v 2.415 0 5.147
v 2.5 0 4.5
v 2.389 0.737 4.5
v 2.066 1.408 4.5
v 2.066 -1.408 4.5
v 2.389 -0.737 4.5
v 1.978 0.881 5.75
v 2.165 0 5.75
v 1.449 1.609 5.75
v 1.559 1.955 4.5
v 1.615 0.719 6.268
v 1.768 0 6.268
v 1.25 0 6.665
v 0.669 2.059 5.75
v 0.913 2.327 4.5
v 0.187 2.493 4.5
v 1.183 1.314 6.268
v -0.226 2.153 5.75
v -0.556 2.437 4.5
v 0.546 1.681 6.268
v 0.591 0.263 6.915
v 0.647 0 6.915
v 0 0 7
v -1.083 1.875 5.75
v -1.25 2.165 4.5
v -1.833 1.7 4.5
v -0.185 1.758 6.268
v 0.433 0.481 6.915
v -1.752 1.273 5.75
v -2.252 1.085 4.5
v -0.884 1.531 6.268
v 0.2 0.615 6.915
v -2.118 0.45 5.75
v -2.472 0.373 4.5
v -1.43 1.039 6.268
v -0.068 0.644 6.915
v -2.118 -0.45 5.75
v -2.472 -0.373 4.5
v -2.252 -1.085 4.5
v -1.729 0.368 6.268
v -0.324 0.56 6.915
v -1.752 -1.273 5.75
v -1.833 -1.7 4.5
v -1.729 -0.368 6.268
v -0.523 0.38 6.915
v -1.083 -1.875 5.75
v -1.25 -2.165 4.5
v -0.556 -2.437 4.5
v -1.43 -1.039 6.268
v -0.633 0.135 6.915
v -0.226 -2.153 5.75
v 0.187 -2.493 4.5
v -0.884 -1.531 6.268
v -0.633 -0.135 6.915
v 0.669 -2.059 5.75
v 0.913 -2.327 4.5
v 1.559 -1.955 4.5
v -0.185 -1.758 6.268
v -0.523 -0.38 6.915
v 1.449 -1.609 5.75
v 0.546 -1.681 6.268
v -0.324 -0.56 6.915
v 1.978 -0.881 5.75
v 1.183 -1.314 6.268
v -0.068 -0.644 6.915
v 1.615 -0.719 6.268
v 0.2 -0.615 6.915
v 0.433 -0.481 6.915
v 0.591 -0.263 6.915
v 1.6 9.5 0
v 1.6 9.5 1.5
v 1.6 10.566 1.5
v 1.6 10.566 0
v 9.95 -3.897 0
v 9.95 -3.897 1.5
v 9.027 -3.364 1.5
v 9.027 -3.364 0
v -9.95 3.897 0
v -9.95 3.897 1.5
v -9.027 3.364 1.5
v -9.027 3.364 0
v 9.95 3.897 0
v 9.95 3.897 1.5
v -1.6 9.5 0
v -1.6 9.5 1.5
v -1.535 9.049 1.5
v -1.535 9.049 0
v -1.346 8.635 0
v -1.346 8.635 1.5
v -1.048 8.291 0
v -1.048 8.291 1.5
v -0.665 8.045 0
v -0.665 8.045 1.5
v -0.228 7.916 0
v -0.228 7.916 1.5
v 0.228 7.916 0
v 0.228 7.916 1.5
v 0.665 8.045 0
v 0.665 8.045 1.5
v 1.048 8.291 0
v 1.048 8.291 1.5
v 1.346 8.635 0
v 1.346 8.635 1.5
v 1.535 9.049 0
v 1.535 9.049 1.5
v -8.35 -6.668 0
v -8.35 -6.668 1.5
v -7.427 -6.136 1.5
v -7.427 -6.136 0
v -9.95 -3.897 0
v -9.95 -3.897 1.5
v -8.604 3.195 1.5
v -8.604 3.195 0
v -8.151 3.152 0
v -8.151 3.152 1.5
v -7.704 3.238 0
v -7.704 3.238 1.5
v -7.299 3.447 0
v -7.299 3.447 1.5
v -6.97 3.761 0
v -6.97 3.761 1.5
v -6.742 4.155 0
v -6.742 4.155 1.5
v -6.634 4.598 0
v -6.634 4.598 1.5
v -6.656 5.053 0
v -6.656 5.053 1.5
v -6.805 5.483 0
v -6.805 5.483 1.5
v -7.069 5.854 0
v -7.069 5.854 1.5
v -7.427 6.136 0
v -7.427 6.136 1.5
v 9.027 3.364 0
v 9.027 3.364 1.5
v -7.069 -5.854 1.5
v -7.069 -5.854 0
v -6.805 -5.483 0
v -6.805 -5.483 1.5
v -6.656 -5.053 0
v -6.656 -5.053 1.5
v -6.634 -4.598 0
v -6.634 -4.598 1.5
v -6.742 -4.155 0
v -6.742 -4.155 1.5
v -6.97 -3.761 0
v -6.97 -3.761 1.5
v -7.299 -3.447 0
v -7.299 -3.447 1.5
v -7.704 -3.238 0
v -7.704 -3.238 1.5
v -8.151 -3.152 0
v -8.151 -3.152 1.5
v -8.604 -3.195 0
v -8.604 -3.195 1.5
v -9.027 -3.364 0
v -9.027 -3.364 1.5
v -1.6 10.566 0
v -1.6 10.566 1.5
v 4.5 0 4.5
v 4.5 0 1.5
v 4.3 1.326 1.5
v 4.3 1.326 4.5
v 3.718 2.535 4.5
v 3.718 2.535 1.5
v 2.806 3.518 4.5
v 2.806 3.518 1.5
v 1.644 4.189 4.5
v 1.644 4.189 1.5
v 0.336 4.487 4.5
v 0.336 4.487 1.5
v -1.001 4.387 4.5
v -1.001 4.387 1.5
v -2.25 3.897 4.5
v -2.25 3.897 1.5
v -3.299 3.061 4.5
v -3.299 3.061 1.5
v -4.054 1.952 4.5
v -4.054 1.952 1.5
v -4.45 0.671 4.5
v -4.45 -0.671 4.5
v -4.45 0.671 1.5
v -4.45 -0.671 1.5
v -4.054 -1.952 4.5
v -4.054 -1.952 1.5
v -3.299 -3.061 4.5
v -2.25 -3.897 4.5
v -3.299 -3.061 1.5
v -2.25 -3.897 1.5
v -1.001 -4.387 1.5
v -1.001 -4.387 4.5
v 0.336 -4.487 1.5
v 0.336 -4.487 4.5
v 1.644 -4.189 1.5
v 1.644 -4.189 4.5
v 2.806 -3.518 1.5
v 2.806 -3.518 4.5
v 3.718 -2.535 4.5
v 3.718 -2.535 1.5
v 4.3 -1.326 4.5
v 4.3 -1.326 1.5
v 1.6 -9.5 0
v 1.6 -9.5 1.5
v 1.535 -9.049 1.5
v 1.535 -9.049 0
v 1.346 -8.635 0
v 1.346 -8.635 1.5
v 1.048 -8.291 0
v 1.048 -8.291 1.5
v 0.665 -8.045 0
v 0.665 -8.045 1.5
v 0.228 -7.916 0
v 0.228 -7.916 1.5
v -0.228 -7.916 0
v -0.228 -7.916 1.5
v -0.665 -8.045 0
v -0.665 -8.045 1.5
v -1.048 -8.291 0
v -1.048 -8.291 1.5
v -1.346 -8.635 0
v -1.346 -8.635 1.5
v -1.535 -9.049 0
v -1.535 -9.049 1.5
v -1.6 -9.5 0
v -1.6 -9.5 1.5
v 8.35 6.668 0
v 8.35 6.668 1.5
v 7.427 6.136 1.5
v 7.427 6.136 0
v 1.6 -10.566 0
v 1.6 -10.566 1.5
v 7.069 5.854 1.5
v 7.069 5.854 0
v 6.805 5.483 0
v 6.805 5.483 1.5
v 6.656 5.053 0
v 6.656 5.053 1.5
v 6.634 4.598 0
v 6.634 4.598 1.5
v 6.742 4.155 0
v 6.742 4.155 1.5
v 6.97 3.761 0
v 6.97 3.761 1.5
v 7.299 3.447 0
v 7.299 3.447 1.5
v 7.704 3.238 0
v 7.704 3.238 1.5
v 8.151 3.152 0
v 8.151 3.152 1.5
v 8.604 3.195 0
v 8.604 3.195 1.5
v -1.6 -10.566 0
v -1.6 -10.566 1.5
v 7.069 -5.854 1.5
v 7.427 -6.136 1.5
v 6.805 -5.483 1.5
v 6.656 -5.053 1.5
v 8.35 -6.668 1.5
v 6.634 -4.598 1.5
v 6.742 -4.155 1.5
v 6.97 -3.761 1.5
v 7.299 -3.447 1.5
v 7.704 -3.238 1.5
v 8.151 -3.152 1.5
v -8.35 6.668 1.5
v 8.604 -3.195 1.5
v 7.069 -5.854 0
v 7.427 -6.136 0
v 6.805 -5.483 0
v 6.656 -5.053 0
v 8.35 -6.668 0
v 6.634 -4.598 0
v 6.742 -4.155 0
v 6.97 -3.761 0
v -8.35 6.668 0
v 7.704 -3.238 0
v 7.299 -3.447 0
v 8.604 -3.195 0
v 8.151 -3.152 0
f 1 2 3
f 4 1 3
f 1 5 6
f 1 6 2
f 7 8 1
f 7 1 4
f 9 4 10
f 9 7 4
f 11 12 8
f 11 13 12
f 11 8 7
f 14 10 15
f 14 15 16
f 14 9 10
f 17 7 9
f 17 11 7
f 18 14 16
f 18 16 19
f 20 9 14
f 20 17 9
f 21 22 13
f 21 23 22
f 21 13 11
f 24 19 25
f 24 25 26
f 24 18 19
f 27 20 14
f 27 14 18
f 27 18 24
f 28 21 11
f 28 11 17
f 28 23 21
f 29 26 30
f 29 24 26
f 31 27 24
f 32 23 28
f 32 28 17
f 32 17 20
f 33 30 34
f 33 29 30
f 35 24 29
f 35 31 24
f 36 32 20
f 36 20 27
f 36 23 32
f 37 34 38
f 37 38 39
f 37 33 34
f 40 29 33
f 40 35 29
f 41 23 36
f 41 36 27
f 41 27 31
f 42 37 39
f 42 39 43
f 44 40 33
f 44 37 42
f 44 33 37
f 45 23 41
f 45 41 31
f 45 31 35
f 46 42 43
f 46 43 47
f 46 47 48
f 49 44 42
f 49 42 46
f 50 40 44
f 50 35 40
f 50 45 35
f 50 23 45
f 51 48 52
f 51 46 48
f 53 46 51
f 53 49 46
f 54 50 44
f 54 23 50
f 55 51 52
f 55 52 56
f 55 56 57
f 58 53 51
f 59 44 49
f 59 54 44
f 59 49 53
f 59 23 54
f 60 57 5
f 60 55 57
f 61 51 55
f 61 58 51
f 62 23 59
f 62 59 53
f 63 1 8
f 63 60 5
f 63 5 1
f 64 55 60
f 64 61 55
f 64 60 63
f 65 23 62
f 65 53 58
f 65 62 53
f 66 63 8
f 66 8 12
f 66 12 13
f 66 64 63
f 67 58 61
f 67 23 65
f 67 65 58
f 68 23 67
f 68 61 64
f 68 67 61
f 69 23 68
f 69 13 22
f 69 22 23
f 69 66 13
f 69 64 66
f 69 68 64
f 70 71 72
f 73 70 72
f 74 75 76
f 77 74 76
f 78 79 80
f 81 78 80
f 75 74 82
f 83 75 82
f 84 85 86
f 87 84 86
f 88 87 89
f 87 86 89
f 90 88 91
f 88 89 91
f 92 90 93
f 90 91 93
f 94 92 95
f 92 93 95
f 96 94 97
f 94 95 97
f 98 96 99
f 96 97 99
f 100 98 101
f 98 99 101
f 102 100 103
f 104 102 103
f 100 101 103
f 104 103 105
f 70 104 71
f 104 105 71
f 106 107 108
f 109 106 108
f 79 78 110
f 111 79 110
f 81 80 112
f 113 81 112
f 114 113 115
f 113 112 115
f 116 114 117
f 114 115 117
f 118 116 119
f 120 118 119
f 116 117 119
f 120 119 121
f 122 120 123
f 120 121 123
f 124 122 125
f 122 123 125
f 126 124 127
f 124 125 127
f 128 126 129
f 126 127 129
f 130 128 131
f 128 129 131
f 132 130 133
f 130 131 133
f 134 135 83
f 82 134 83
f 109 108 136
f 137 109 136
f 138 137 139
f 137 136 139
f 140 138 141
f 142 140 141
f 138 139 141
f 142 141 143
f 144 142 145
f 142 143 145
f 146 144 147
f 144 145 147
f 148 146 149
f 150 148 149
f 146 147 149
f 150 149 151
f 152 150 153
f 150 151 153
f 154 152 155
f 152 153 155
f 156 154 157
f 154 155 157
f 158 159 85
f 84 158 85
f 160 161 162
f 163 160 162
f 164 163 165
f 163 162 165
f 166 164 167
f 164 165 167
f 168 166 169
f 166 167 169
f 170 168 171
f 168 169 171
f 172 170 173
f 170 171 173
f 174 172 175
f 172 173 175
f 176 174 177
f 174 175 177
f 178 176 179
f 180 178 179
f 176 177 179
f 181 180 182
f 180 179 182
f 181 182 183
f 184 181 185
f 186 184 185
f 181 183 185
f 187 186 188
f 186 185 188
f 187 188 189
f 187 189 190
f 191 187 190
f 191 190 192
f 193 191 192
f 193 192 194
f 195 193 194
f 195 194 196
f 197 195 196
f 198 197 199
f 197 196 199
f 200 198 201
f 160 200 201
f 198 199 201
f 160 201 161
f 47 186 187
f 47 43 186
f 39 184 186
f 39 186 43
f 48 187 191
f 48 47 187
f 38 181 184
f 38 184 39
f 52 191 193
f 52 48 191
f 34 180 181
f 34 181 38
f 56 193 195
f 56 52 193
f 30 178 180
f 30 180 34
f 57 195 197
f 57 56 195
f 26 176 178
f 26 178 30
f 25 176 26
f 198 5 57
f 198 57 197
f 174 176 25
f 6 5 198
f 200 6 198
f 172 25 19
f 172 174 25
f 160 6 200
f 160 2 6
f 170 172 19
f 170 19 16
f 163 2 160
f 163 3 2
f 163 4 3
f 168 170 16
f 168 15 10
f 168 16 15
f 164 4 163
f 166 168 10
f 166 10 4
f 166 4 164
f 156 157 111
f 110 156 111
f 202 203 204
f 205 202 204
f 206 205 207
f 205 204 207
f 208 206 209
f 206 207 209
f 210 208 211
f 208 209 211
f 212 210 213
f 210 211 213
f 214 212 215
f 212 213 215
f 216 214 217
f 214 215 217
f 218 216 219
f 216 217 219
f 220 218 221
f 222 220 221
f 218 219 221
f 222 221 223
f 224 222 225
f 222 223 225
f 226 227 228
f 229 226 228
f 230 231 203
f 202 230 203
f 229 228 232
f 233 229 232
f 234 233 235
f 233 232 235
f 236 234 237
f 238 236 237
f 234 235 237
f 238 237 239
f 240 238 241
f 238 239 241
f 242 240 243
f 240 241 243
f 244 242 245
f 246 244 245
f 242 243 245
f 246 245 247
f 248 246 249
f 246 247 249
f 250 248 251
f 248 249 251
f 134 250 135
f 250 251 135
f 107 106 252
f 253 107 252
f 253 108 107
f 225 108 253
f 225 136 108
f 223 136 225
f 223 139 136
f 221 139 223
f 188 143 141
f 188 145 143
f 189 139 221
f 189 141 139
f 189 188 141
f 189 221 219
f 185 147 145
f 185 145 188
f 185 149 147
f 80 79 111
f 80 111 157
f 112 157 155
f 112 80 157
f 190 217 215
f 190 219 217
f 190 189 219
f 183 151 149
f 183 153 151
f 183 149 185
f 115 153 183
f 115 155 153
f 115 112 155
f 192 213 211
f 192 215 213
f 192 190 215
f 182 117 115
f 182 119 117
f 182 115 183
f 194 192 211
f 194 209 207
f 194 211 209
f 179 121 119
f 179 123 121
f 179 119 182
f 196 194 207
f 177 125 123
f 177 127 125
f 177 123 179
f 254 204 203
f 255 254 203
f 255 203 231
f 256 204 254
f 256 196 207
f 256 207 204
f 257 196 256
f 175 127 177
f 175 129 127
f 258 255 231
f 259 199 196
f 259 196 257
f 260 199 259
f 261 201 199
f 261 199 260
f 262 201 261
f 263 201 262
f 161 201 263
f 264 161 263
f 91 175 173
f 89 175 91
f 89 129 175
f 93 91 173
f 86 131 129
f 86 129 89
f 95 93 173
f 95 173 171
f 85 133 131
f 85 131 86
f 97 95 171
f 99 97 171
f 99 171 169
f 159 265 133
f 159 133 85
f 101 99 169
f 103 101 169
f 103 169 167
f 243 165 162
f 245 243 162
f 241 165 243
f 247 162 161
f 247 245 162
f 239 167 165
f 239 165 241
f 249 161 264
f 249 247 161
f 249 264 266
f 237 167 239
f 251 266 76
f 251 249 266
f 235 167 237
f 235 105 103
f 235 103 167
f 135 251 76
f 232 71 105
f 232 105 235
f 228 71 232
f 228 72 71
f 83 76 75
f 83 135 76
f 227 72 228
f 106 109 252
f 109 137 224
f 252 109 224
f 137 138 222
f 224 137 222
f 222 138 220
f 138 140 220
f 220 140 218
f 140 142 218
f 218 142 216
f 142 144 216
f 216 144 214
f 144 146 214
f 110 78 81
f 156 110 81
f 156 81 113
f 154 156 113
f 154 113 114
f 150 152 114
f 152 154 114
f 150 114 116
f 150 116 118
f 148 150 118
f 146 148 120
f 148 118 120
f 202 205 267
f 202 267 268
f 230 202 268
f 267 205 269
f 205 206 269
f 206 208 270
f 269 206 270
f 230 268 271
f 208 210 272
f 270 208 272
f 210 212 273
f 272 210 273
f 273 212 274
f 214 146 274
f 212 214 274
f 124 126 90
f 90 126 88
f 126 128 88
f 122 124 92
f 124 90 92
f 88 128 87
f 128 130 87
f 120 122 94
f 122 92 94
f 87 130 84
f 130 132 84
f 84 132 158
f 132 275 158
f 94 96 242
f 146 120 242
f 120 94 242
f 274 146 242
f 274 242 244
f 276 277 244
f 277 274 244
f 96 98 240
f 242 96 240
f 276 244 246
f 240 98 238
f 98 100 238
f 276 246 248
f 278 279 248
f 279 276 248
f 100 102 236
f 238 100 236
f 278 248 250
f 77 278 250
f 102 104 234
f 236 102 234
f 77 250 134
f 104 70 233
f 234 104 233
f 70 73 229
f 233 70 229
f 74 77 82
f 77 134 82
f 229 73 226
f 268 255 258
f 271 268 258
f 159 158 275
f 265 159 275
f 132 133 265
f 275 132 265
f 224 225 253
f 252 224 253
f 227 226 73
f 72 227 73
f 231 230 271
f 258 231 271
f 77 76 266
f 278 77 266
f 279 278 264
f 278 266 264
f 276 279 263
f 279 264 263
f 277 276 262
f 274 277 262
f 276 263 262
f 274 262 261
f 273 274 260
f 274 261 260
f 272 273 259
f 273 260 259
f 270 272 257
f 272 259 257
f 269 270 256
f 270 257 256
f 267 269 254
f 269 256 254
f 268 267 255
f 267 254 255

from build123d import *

# Parameters (mm, degrees)
F1_DEPTH = 1.5
F3_DEPTH = 1.501
F4_R     = 4.5
F5_DEPTH = 3
F6_R     = 2.5
F7_DEPTH = 2.5
F8_R     = 2.49999


# Not quite as in the source:
# - a fillet or chamfer is up to 0.001 mm smaller than in the source, because OpenCascade refuses the exact size


with BuildPart() as f1:
    # F0 (on Top) → F1 (new body)
    with BuildSketch(Plane.XY):
        Polygon((9.95, -5.7446351784), (9.95, 5.7446351784), (0, 11.4892703569), (-9.95, 5.7446351784), (-9.95, -5.7446351784), (0, -11.4892703569), align=None)
    extrude(amount=F1_DEPTH)

    # F2 (on face) → F3 (cut, through all)
    with BuildSketch(Plane.XY.offset(1.5)):
        with BuildLine():
            Line((-1.6, 10.5655099262), (-1.6, 9.5))
            ThreePointArc((-1.6, 9.5), (0, 7.9), (1.6, 9.5))
            Line((1.6, 9.5), (1.6, 10.5655099262))
            Line((1.6, 10.5655099262), (0, 11.4892703569))
            Line((0, 11.4892703569), (-1.6, 10.5655099262))
        make_face()
        with BuildLine():
            Line((9.95, 5.7446351784), (8.35, 6.6683956091))
            Line((8.35, 6.6683956091), (7.427241336, 6.1356406461))
            ThreePointArc((7.427241336, 6.1356406461), (6.8416006899, 3.95), (9.027241336, 3.3643593539))
            Line((9.027241336, 3.3643593539), (9.95, 3.897114317))
            Line((9.95, 3.897114317), (9.95, 5.7446351784))
        make_face()
        with BuildLine():
            Line((9.95, -5.7446351784), (9.95, -3.897114317))
            Line((9.95, -3.897114317), (9.027241336, -3.3643593539))
            ThreePointArc((9.027241336, -3.3643593539), (6.8416006899, -3.95), (7.427241336, -6.1356406461))
            Line((7.427241336, -6.1356406461), (8.35, -6.6683956091))
            Line((8.35, -6.6683956091), (9.95, -5.7446351784))
        make_face()
        with BuildLine():
            Line((-9.027241336, -3.3643593539), (-9.95, -3.897114317))
            Line((-9.95, -3.897114317), (-9.95, -5.7446351784))
            Line((-9.95, -5.7446351784), (-8.35, -6.6683956091))
            Line((-8.35, -6.6683956091), (-7.427241336, -6.1356406461))
            ThreePointArc((-7.427241336, -6.1356406461), (-6.8416006899, -3.95), (-9.027241336, -3.3643593539))
        make_face()
        with BuildLine():
            Line((-7.427241336, 6.1356406461), (-8.35, 6.6683956091))
            Line((-8.35, 6.6683956091), (-9.95, 5.7446351784))
            Line((-9.95, 5.7446351784), (-9.95, 3.897114317))
            Line((-9.95, 3.897114317), (-9.027241336, 3.3643593539))
            ThreePointArc((-9.027241336, 3.3643593539), (-6.8416006899, 3.95), (-7.427241336, 6.1356406461))
        make_face()
        with BuildLine():
            Line((-1.6, -9.5), (-1.6, -10.5655099262))
            Line((-1.6, -10.5655099262), (0, -11.4892703569))
            Line((0, -11.4892703569), (1.6, -10.5655099262))
            Line((1.6, -10.5655099262), (1.6, -9.5))
            ThreePointArc((1.6, -9.5), (0, -7.9), (-1.6, -9.5))
        make_face()
    extrude(amount=-F3_DEPTH, mode=Mode.SUBTRACT)

    # F4 (on face) → F5 (join)
    with BuildSketch(Plane.XY.offset(1.5)):
        Circle(F4_R)
    extrude(amount=F5_DEPTH)

    # F6 (on face) → F7 (join)
    with BuildSketch(Plane.XY.offset(4.5)):
        Circle(F6_R)
    extrude(amount=F7_DEPTH)

    # F8 (radius 2.5 in the source; OpenCascade refuses exactly that, so slightly less here)
    f8_edges = [f1.edges().sort_by_distance(p)[0] for p in [
        (-2.5, 0, 7),
    ]]
    fillet(f8_edges, radius=F8_R)


solid = f1.part
